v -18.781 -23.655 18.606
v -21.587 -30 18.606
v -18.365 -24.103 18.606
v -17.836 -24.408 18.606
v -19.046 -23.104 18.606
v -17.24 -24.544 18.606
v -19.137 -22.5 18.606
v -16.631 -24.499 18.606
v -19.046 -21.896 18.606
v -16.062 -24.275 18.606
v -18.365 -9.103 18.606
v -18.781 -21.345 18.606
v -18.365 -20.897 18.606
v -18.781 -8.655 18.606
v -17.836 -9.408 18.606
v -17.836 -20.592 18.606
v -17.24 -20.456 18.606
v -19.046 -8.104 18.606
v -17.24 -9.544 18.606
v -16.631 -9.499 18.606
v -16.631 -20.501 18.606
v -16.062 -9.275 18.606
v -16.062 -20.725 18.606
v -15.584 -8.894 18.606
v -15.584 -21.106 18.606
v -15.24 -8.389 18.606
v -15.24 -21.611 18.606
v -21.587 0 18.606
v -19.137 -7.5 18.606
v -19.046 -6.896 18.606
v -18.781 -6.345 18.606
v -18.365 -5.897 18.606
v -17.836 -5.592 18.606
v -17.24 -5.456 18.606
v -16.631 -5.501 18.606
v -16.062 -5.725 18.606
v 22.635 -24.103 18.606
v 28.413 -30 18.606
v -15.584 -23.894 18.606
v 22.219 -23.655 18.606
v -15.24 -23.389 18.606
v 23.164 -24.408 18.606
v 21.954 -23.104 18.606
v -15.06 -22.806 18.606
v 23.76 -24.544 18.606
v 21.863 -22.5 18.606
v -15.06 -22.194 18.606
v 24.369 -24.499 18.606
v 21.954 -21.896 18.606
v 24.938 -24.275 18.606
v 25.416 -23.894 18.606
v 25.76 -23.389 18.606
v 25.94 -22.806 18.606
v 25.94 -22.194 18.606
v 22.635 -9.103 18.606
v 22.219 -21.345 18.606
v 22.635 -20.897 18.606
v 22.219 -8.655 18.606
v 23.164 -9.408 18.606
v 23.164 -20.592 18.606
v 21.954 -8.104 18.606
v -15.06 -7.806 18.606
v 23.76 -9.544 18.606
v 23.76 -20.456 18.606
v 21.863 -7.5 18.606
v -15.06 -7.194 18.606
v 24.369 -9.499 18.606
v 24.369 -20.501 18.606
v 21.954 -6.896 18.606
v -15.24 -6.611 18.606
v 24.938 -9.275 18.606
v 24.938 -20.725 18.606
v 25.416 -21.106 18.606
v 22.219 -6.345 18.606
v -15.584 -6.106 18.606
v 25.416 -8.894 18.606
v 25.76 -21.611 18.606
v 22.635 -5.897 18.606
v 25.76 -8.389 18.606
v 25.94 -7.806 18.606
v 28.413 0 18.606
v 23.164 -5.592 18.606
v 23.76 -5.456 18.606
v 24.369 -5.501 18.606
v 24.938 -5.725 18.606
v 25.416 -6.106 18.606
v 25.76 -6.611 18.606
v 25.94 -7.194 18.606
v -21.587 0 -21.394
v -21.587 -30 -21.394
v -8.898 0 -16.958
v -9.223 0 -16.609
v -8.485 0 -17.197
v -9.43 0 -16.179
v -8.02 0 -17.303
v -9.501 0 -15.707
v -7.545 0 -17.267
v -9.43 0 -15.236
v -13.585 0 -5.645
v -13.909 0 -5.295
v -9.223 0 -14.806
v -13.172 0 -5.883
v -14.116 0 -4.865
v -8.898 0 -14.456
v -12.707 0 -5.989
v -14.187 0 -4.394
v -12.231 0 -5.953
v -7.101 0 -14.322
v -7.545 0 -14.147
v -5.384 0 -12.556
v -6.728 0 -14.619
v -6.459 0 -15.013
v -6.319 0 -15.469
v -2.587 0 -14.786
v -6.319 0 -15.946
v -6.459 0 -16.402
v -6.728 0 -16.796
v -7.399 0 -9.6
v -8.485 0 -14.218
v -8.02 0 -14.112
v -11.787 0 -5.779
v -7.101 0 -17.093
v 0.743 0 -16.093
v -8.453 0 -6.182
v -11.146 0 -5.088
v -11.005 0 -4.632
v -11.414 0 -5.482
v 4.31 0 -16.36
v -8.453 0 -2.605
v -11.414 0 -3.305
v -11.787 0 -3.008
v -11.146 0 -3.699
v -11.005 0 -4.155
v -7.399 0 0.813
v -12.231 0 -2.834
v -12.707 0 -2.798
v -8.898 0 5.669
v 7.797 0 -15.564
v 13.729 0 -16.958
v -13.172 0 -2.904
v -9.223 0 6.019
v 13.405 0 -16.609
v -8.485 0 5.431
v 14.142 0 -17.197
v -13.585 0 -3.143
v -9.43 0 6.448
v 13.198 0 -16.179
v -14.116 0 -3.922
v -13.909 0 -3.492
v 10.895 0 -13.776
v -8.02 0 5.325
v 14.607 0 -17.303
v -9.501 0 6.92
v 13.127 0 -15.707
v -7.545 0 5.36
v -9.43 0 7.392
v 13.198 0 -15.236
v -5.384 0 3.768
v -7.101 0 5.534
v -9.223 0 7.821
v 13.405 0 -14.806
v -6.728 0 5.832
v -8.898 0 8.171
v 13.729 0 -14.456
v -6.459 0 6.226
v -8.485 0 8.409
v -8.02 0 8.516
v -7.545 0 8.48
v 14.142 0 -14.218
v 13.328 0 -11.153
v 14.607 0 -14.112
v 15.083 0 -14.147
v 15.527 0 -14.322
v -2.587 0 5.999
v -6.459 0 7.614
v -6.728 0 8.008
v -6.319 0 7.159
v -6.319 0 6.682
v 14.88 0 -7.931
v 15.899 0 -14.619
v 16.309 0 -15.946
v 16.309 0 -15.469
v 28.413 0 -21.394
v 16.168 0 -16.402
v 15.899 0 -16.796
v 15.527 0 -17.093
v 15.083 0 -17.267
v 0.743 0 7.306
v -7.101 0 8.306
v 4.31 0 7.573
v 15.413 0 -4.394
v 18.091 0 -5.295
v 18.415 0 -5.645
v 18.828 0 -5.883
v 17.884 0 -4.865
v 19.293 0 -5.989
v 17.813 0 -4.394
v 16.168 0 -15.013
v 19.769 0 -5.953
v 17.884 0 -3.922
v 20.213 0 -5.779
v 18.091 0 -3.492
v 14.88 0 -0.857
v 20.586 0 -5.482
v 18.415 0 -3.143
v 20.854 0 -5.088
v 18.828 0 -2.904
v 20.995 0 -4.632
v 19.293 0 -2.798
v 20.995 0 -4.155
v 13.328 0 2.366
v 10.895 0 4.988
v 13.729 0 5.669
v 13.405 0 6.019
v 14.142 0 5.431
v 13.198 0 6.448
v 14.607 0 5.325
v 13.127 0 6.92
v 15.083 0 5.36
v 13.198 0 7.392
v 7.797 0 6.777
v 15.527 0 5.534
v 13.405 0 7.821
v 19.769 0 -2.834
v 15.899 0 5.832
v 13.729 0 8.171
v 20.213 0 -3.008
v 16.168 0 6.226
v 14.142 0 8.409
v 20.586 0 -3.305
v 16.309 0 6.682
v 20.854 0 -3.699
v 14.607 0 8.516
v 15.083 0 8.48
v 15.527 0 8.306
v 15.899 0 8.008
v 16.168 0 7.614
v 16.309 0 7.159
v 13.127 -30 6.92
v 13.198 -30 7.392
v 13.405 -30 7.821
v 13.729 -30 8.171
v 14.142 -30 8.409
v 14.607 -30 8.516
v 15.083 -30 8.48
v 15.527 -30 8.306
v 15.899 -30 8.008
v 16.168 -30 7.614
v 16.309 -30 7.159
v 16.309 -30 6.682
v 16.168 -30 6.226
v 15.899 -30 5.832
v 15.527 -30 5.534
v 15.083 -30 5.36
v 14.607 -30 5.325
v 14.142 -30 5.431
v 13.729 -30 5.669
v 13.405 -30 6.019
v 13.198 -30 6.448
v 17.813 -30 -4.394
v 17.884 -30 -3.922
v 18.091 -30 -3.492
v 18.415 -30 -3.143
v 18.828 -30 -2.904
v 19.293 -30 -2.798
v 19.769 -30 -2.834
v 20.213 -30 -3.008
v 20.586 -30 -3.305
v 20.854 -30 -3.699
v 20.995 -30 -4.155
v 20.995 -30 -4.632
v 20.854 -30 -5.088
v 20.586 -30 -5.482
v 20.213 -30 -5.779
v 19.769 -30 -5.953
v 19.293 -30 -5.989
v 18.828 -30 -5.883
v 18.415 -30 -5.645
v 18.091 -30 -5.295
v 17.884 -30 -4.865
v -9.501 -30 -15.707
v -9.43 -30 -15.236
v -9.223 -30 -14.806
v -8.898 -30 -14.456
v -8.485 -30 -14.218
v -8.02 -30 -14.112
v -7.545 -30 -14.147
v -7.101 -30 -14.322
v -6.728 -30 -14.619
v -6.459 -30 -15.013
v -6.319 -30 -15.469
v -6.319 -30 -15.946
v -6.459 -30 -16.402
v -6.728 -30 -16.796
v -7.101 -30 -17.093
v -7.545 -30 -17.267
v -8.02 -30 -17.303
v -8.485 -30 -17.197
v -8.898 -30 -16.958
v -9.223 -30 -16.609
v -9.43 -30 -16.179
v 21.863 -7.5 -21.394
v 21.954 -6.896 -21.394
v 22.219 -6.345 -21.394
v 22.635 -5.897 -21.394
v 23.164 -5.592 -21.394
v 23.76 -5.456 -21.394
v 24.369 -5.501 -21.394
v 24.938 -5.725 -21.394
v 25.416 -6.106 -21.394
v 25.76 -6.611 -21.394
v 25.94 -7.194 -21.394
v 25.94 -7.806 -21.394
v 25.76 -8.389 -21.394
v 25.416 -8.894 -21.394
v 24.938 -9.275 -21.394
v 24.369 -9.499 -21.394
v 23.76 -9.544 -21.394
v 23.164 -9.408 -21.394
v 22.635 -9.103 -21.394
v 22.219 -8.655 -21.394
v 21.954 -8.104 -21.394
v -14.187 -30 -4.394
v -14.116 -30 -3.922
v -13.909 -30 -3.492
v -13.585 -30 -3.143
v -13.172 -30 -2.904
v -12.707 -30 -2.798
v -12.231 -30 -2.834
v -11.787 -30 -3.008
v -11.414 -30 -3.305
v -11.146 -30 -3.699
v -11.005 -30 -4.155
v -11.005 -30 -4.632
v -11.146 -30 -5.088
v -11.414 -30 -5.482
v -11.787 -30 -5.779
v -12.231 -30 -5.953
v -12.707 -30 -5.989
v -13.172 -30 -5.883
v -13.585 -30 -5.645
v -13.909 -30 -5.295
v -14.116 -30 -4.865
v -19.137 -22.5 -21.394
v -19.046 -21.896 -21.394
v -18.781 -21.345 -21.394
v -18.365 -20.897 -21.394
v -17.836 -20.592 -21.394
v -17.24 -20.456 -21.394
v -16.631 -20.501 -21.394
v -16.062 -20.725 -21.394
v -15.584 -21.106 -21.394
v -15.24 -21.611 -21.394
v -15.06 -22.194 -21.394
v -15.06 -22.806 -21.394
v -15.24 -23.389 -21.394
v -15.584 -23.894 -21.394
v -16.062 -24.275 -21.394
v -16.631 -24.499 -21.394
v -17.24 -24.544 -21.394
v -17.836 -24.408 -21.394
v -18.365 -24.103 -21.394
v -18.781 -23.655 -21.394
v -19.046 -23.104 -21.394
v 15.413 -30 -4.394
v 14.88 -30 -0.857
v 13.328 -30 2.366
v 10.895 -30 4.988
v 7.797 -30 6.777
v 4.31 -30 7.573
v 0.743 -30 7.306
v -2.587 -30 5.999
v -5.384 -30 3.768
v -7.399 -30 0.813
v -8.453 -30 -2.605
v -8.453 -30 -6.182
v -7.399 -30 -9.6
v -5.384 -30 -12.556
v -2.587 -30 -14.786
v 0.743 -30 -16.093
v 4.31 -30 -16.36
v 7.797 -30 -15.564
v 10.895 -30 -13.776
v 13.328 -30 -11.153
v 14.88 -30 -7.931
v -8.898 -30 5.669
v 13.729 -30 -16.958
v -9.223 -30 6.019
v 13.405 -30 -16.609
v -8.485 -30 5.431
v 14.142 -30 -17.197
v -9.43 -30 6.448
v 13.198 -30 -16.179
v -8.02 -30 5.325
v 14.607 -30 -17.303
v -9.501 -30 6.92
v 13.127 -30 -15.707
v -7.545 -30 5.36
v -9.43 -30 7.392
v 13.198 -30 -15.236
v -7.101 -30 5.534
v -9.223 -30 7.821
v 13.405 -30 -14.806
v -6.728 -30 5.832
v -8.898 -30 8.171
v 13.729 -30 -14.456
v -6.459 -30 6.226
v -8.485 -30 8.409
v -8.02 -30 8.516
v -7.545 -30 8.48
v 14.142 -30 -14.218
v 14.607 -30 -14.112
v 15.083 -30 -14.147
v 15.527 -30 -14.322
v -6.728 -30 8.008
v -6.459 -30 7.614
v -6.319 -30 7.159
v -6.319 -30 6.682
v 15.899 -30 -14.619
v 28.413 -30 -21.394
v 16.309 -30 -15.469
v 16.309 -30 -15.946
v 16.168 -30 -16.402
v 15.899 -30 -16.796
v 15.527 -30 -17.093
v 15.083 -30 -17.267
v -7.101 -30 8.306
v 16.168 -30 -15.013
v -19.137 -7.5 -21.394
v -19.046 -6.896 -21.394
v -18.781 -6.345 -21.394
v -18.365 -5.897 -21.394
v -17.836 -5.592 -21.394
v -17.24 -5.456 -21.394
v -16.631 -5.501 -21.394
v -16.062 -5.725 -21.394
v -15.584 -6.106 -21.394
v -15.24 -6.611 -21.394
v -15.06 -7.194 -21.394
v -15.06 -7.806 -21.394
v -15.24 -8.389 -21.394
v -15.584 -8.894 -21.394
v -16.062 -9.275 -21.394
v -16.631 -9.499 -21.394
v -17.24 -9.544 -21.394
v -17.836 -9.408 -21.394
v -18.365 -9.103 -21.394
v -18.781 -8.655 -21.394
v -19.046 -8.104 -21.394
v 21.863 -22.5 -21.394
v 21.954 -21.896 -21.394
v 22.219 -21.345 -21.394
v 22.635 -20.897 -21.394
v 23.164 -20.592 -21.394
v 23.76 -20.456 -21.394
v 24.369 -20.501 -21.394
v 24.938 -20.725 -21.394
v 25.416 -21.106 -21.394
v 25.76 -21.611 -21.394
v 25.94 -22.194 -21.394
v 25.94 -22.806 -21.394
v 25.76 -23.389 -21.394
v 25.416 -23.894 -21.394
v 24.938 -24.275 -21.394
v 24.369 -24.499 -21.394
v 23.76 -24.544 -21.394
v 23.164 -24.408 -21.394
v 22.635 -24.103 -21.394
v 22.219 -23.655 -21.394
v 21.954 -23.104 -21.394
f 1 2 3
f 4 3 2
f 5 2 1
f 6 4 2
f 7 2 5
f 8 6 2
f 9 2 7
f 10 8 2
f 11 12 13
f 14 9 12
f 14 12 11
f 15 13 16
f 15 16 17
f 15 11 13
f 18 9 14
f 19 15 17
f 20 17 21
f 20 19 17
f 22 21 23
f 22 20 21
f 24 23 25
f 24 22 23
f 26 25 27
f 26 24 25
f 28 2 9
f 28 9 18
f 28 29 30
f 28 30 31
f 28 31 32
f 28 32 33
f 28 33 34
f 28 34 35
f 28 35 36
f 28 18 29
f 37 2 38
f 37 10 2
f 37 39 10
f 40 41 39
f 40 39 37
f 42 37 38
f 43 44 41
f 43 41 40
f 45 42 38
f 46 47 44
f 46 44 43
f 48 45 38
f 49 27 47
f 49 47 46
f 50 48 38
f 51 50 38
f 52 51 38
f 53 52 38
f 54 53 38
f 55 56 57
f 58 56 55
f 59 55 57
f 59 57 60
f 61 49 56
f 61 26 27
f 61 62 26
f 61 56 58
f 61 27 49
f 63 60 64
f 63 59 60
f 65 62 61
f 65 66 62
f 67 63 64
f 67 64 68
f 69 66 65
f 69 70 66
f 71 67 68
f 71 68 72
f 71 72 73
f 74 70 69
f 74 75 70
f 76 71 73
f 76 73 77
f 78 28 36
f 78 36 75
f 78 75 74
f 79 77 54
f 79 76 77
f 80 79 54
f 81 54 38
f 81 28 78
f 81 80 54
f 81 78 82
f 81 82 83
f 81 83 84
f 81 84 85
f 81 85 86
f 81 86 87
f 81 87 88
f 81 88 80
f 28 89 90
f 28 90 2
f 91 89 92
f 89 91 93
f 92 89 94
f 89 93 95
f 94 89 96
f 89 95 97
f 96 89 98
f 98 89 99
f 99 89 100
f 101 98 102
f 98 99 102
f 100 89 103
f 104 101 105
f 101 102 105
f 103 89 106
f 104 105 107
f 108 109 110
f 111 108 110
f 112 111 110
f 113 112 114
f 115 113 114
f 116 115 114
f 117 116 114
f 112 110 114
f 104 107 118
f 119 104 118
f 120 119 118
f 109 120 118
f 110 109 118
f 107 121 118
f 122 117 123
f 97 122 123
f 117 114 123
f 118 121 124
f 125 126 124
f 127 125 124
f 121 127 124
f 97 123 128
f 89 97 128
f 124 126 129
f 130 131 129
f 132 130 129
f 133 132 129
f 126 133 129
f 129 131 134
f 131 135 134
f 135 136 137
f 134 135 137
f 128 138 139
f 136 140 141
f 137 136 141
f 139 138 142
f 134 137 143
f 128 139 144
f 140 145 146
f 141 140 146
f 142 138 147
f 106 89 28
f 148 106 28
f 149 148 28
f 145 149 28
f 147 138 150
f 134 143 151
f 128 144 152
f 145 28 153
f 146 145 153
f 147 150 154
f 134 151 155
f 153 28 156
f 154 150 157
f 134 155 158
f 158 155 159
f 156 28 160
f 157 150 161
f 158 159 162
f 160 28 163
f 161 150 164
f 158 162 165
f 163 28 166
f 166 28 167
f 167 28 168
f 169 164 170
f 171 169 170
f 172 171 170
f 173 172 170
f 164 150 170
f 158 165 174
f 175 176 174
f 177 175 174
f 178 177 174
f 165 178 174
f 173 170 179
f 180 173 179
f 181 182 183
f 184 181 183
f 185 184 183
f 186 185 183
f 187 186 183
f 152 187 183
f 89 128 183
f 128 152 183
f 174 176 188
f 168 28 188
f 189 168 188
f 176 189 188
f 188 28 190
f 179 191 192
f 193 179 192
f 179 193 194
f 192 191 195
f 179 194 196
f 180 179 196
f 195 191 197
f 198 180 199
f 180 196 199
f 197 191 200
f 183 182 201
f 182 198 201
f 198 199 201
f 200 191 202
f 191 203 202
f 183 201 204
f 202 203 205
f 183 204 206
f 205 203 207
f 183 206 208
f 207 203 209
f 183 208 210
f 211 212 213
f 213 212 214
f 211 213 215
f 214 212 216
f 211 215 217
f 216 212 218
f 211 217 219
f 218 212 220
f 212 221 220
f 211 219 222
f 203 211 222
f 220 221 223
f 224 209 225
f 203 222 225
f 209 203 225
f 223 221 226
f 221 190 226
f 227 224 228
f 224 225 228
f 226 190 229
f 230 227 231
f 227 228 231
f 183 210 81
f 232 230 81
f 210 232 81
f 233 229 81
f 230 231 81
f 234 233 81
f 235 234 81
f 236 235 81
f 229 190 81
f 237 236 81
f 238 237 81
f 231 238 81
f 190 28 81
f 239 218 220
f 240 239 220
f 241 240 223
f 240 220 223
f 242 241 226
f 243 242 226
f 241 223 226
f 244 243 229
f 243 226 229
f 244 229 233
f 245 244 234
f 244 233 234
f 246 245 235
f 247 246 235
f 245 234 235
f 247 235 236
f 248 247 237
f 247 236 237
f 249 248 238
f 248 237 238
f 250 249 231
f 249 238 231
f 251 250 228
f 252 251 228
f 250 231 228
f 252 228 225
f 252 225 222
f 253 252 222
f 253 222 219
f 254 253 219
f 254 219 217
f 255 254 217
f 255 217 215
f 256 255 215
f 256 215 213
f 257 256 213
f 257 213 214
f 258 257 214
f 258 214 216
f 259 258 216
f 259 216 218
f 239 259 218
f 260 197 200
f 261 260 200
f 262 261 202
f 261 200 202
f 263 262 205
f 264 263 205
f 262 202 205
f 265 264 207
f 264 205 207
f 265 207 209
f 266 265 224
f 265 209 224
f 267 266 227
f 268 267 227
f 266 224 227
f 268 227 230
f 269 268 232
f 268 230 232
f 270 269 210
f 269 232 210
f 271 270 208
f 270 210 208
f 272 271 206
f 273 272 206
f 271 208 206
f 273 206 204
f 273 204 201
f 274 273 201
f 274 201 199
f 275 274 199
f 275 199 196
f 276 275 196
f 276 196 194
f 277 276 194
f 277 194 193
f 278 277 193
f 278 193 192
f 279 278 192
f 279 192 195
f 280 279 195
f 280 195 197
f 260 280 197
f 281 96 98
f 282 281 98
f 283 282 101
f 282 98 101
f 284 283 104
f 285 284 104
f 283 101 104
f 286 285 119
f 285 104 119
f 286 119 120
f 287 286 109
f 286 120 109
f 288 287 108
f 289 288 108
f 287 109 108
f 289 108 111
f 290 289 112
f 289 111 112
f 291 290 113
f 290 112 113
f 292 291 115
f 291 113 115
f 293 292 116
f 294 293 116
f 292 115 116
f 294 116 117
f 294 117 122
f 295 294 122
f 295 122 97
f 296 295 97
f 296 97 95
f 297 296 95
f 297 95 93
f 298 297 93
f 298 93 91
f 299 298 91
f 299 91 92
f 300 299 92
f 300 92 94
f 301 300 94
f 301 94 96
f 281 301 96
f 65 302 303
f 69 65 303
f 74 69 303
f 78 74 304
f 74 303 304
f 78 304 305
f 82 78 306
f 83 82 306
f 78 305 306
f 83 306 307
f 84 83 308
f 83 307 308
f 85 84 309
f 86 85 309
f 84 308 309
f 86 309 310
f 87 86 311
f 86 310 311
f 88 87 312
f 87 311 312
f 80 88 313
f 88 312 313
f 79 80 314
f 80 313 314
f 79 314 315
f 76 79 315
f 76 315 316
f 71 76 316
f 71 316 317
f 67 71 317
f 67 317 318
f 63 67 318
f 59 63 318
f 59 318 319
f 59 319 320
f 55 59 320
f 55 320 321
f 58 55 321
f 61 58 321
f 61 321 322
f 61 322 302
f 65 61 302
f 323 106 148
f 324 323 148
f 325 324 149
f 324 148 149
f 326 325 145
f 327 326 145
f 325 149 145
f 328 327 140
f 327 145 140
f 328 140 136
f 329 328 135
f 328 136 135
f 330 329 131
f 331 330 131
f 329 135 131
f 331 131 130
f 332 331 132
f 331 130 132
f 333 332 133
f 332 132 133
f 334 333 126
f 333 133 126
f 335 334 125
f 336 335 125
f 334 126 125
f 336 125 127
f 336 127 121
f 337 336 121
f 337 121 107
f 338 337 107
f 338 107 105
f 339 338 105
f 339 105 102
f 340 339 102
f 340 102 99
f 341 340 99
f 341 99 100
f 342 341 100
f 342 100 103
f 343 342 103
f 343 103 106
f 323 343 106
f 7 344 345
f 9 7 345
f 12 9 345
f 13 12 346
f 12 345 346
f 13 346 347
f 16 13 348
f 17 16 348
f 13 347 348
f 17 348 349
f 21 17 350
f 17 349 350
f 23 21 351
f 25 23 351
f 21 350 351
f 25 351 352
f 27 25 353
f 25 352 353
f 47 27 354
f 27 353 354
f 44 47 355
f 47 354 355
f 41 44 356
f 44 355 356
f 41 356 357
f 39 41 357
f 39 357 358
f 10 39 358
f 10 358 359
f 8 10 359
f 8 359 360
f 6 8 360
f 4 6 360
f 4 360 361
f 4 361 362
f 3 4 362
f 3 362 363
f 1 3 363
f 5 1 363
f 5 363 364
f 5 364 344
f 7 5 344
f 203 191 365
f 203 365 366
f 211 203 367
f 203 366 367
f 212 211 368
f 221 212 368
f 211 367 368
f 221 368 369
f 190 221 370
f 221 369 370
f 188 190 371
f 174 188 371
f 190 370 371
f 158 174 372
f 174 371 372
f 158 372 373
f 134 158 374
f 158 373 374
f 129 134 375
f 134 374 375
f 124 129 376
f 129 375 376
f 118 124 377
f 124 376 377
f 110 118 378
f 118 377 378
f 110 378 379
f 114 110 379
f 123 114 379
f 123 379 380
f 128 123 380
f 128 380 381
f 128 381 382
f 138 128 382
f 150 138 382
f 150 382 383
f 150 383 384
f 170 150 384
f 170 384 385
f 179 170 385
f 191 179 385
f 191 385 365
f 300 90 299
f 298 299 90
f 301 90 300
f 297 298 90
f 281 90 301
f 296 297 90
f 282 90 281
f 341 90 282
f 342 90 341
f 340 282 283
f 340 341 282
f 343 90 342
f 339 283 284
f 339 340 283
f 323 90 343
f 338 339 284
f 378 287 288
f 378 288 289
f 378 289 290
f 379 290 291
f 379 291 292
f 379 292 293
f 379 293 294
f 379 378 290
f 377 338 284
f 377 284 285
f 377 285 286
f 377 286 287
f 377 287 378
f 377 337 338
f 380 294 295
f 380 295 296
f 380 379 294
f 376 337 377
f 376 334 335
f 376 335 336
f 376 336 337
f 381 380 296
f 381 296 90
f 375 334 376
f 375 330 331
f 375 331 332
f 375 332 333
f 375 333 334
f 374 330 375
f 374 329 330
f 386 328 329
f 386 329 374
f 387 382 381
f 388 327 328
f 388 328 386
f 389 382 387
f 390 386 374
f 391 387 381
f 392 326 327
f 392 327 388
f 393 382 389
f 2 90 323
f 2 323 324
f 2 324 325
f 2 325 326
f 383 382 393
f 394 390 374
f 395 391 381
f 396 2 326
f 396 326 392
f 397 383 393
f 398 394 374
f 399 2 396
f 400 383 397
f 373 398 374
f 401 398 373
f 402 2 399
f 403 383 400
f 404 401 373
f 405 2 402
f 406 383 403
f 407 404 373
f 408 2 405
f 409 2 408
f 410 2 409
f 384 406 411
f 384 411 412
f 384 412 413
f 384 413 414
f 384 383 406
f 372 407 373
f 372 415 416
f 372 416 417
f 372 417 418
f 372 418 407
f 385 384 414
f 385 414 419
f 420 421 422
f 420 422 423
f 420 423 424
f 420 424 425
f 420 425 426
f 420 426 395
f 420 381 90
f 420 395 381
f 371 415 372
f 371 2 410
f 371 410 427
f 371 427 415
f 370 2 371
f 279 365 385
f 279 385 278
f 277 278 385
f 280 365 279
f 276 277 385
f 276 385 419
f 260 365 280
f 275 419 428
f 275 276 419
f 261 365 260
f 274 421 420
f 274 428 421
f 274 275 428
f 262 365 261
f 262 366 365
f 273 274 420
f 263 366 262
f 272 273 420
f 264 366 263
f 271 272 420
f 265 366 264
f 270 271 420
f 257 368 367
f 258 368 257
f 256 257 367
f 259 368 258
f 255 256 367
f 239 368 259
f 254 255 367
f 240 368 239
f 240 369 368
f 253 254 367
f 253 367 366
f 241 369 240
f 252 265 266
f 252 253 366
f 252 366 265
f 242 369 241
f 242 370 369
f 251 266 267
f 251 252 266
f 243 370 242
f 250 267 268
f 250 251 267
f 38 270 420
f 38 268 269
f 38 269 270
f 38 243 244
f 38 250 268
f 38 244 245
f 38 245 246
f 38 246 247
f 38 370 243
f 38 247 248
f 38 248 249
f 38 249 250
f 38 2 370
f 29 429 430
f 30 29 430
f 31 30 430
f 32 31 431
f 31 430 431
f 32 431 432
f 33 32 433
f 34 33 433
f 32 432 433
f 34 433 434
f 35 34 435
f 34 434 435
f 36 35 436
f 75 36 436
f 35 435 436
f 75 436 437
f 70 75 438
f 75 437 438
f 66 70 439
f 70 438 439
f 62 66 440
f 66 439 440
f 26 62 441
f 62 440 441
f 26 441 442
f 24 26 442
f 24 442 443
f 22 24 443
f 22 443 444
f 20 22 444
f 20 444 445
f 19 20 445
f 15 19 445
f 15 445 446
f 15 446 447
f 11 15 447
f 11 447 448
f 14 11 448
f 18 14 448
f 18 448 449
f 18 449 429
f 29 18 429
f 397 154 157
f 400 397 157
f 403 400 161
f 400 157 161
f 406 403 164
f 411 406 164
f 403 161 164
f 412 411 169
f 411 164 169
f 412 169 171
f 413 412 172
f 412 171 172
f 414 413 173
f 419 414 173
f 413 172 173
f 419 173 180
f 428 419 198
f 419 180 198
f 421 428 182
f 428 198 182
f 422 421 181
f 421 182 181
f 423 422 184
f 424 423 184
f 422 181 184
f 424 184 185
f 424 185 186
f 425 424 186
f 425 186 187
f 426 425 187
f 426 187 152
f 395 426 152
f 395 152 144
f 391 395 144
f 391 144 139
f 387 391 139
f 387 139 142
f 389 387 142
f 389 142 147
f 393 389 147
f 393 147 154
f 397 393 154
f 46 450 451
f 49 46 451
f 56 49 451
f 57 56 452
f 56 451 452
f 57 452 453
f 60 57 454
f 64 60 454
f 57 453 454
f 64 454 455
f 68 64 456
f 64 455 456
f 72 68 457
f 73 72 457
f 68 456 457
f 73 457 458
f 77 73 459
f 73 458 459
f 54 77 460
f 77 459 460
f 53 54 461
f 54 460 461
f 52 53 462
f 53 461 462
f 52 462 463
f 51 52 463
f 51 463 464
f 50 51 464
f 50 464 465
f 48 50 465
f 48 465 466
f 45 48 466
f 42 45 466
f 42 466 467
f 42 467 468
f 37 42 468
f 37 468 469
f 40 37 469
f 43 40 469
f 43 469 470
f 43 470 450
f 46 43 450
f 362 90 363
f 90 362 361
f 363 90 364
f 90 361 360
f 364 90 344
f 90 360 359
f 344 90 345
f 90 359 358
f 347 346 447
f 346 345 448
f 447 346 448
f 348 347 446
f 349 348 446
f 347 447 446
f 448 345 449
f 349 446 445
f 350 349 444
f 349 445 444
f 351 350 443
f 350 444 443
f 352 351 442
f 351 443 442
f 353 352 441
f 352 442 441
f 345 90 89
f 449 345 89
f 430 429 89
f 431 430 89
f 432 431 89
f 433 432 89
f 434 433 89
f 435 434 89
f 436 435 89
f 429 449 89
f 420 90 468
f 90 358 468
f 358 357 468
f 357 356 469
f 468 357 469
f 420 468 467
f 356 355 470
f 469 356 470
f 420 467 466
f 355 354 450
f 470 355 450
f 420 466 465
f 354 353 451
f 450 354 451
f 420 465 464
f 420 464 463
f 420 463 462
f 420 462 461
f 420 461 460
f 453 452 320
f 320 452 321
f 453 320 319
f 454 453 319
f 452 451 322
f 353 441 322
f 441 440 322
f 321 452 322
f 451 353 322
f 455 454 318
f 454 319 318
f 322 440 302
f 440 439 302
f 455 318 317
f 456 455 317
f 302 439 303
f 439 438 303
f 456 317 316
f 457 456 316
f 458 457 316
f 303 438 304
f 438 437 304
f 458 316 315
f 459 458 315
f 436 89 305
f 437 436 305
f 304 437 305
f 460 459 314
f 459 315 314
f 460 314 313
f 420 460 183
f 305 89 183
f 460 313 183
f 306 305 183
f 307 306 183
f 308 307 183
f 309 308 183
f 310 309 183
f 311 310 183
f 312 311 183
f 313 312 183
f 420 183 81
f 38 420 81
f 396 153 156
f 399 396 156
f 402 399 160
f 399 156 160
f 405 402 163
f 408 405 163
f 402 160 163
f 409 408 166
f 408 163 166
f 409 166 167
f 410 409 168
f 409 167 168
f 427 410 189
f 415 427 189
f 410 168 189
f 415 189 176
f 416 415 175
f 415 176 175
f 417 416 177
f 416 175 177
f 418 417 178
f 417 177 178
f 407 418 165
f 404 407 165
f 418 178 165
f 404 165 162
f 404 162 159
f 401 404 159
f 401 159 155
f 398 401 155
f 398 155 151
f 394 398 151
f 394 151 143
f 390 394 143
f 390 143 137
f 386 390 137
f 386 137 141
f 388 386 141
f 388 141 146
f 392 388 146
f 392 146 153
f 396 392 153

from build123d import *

# Parameters (mm, degrees)
F0_W     = 50
F0_H     = 40
F1_DEPTH = 30
F2_R     = 12
F3_DEPTH = 30.001
F4_D     = 3.2
F6_D     = 4.1


# Not quite as in the source:
# - a feature names something its author has since deleted; it is built from what else it names


with BuildPart() as f1:
    # F0 (on Front) → F1 (new body)
    with BuildSketch(Plane.XZ):
        with Locations((3.412880823, -1.3936108311)):
            Rectangle(F0_W, F0_H)
    extrude(amount=F1_DEPTH)

    # F2 (on face) → F3 (cut, through all)
    with BuildSketch(Plane.XZ.offset(30)):
        with Locations((3.412880823, -4.3936108311)):
            Circle(F2_R)
    extrude(amount=-F3_DEPTH, mode=Mode.SUBTRACT)

    # F4 (through all)
    with Locations(Plane.XZ.offset(30)):
        with Locations((-7.900827676, 6.9200976679), (-12.587119177, -4.3936108311), (-7.900827676, -15.7073193301), (14.726589322, -15.7073193301), (19.412880823, -4.3936108311), (14.726589322, 6.9200976679)):
            Hole(F4_D / 2)

    # F6 (through all)
    with Locations(Plane.XY.offset(18.6063891689)):
        with Locations((23.912880823, -22.5), (23.912880823, -7.5), (-17.087119177, -7.5), (-17.087119177, -22.5)):
            Hole(F6_D / 2)


solid = f1.part
